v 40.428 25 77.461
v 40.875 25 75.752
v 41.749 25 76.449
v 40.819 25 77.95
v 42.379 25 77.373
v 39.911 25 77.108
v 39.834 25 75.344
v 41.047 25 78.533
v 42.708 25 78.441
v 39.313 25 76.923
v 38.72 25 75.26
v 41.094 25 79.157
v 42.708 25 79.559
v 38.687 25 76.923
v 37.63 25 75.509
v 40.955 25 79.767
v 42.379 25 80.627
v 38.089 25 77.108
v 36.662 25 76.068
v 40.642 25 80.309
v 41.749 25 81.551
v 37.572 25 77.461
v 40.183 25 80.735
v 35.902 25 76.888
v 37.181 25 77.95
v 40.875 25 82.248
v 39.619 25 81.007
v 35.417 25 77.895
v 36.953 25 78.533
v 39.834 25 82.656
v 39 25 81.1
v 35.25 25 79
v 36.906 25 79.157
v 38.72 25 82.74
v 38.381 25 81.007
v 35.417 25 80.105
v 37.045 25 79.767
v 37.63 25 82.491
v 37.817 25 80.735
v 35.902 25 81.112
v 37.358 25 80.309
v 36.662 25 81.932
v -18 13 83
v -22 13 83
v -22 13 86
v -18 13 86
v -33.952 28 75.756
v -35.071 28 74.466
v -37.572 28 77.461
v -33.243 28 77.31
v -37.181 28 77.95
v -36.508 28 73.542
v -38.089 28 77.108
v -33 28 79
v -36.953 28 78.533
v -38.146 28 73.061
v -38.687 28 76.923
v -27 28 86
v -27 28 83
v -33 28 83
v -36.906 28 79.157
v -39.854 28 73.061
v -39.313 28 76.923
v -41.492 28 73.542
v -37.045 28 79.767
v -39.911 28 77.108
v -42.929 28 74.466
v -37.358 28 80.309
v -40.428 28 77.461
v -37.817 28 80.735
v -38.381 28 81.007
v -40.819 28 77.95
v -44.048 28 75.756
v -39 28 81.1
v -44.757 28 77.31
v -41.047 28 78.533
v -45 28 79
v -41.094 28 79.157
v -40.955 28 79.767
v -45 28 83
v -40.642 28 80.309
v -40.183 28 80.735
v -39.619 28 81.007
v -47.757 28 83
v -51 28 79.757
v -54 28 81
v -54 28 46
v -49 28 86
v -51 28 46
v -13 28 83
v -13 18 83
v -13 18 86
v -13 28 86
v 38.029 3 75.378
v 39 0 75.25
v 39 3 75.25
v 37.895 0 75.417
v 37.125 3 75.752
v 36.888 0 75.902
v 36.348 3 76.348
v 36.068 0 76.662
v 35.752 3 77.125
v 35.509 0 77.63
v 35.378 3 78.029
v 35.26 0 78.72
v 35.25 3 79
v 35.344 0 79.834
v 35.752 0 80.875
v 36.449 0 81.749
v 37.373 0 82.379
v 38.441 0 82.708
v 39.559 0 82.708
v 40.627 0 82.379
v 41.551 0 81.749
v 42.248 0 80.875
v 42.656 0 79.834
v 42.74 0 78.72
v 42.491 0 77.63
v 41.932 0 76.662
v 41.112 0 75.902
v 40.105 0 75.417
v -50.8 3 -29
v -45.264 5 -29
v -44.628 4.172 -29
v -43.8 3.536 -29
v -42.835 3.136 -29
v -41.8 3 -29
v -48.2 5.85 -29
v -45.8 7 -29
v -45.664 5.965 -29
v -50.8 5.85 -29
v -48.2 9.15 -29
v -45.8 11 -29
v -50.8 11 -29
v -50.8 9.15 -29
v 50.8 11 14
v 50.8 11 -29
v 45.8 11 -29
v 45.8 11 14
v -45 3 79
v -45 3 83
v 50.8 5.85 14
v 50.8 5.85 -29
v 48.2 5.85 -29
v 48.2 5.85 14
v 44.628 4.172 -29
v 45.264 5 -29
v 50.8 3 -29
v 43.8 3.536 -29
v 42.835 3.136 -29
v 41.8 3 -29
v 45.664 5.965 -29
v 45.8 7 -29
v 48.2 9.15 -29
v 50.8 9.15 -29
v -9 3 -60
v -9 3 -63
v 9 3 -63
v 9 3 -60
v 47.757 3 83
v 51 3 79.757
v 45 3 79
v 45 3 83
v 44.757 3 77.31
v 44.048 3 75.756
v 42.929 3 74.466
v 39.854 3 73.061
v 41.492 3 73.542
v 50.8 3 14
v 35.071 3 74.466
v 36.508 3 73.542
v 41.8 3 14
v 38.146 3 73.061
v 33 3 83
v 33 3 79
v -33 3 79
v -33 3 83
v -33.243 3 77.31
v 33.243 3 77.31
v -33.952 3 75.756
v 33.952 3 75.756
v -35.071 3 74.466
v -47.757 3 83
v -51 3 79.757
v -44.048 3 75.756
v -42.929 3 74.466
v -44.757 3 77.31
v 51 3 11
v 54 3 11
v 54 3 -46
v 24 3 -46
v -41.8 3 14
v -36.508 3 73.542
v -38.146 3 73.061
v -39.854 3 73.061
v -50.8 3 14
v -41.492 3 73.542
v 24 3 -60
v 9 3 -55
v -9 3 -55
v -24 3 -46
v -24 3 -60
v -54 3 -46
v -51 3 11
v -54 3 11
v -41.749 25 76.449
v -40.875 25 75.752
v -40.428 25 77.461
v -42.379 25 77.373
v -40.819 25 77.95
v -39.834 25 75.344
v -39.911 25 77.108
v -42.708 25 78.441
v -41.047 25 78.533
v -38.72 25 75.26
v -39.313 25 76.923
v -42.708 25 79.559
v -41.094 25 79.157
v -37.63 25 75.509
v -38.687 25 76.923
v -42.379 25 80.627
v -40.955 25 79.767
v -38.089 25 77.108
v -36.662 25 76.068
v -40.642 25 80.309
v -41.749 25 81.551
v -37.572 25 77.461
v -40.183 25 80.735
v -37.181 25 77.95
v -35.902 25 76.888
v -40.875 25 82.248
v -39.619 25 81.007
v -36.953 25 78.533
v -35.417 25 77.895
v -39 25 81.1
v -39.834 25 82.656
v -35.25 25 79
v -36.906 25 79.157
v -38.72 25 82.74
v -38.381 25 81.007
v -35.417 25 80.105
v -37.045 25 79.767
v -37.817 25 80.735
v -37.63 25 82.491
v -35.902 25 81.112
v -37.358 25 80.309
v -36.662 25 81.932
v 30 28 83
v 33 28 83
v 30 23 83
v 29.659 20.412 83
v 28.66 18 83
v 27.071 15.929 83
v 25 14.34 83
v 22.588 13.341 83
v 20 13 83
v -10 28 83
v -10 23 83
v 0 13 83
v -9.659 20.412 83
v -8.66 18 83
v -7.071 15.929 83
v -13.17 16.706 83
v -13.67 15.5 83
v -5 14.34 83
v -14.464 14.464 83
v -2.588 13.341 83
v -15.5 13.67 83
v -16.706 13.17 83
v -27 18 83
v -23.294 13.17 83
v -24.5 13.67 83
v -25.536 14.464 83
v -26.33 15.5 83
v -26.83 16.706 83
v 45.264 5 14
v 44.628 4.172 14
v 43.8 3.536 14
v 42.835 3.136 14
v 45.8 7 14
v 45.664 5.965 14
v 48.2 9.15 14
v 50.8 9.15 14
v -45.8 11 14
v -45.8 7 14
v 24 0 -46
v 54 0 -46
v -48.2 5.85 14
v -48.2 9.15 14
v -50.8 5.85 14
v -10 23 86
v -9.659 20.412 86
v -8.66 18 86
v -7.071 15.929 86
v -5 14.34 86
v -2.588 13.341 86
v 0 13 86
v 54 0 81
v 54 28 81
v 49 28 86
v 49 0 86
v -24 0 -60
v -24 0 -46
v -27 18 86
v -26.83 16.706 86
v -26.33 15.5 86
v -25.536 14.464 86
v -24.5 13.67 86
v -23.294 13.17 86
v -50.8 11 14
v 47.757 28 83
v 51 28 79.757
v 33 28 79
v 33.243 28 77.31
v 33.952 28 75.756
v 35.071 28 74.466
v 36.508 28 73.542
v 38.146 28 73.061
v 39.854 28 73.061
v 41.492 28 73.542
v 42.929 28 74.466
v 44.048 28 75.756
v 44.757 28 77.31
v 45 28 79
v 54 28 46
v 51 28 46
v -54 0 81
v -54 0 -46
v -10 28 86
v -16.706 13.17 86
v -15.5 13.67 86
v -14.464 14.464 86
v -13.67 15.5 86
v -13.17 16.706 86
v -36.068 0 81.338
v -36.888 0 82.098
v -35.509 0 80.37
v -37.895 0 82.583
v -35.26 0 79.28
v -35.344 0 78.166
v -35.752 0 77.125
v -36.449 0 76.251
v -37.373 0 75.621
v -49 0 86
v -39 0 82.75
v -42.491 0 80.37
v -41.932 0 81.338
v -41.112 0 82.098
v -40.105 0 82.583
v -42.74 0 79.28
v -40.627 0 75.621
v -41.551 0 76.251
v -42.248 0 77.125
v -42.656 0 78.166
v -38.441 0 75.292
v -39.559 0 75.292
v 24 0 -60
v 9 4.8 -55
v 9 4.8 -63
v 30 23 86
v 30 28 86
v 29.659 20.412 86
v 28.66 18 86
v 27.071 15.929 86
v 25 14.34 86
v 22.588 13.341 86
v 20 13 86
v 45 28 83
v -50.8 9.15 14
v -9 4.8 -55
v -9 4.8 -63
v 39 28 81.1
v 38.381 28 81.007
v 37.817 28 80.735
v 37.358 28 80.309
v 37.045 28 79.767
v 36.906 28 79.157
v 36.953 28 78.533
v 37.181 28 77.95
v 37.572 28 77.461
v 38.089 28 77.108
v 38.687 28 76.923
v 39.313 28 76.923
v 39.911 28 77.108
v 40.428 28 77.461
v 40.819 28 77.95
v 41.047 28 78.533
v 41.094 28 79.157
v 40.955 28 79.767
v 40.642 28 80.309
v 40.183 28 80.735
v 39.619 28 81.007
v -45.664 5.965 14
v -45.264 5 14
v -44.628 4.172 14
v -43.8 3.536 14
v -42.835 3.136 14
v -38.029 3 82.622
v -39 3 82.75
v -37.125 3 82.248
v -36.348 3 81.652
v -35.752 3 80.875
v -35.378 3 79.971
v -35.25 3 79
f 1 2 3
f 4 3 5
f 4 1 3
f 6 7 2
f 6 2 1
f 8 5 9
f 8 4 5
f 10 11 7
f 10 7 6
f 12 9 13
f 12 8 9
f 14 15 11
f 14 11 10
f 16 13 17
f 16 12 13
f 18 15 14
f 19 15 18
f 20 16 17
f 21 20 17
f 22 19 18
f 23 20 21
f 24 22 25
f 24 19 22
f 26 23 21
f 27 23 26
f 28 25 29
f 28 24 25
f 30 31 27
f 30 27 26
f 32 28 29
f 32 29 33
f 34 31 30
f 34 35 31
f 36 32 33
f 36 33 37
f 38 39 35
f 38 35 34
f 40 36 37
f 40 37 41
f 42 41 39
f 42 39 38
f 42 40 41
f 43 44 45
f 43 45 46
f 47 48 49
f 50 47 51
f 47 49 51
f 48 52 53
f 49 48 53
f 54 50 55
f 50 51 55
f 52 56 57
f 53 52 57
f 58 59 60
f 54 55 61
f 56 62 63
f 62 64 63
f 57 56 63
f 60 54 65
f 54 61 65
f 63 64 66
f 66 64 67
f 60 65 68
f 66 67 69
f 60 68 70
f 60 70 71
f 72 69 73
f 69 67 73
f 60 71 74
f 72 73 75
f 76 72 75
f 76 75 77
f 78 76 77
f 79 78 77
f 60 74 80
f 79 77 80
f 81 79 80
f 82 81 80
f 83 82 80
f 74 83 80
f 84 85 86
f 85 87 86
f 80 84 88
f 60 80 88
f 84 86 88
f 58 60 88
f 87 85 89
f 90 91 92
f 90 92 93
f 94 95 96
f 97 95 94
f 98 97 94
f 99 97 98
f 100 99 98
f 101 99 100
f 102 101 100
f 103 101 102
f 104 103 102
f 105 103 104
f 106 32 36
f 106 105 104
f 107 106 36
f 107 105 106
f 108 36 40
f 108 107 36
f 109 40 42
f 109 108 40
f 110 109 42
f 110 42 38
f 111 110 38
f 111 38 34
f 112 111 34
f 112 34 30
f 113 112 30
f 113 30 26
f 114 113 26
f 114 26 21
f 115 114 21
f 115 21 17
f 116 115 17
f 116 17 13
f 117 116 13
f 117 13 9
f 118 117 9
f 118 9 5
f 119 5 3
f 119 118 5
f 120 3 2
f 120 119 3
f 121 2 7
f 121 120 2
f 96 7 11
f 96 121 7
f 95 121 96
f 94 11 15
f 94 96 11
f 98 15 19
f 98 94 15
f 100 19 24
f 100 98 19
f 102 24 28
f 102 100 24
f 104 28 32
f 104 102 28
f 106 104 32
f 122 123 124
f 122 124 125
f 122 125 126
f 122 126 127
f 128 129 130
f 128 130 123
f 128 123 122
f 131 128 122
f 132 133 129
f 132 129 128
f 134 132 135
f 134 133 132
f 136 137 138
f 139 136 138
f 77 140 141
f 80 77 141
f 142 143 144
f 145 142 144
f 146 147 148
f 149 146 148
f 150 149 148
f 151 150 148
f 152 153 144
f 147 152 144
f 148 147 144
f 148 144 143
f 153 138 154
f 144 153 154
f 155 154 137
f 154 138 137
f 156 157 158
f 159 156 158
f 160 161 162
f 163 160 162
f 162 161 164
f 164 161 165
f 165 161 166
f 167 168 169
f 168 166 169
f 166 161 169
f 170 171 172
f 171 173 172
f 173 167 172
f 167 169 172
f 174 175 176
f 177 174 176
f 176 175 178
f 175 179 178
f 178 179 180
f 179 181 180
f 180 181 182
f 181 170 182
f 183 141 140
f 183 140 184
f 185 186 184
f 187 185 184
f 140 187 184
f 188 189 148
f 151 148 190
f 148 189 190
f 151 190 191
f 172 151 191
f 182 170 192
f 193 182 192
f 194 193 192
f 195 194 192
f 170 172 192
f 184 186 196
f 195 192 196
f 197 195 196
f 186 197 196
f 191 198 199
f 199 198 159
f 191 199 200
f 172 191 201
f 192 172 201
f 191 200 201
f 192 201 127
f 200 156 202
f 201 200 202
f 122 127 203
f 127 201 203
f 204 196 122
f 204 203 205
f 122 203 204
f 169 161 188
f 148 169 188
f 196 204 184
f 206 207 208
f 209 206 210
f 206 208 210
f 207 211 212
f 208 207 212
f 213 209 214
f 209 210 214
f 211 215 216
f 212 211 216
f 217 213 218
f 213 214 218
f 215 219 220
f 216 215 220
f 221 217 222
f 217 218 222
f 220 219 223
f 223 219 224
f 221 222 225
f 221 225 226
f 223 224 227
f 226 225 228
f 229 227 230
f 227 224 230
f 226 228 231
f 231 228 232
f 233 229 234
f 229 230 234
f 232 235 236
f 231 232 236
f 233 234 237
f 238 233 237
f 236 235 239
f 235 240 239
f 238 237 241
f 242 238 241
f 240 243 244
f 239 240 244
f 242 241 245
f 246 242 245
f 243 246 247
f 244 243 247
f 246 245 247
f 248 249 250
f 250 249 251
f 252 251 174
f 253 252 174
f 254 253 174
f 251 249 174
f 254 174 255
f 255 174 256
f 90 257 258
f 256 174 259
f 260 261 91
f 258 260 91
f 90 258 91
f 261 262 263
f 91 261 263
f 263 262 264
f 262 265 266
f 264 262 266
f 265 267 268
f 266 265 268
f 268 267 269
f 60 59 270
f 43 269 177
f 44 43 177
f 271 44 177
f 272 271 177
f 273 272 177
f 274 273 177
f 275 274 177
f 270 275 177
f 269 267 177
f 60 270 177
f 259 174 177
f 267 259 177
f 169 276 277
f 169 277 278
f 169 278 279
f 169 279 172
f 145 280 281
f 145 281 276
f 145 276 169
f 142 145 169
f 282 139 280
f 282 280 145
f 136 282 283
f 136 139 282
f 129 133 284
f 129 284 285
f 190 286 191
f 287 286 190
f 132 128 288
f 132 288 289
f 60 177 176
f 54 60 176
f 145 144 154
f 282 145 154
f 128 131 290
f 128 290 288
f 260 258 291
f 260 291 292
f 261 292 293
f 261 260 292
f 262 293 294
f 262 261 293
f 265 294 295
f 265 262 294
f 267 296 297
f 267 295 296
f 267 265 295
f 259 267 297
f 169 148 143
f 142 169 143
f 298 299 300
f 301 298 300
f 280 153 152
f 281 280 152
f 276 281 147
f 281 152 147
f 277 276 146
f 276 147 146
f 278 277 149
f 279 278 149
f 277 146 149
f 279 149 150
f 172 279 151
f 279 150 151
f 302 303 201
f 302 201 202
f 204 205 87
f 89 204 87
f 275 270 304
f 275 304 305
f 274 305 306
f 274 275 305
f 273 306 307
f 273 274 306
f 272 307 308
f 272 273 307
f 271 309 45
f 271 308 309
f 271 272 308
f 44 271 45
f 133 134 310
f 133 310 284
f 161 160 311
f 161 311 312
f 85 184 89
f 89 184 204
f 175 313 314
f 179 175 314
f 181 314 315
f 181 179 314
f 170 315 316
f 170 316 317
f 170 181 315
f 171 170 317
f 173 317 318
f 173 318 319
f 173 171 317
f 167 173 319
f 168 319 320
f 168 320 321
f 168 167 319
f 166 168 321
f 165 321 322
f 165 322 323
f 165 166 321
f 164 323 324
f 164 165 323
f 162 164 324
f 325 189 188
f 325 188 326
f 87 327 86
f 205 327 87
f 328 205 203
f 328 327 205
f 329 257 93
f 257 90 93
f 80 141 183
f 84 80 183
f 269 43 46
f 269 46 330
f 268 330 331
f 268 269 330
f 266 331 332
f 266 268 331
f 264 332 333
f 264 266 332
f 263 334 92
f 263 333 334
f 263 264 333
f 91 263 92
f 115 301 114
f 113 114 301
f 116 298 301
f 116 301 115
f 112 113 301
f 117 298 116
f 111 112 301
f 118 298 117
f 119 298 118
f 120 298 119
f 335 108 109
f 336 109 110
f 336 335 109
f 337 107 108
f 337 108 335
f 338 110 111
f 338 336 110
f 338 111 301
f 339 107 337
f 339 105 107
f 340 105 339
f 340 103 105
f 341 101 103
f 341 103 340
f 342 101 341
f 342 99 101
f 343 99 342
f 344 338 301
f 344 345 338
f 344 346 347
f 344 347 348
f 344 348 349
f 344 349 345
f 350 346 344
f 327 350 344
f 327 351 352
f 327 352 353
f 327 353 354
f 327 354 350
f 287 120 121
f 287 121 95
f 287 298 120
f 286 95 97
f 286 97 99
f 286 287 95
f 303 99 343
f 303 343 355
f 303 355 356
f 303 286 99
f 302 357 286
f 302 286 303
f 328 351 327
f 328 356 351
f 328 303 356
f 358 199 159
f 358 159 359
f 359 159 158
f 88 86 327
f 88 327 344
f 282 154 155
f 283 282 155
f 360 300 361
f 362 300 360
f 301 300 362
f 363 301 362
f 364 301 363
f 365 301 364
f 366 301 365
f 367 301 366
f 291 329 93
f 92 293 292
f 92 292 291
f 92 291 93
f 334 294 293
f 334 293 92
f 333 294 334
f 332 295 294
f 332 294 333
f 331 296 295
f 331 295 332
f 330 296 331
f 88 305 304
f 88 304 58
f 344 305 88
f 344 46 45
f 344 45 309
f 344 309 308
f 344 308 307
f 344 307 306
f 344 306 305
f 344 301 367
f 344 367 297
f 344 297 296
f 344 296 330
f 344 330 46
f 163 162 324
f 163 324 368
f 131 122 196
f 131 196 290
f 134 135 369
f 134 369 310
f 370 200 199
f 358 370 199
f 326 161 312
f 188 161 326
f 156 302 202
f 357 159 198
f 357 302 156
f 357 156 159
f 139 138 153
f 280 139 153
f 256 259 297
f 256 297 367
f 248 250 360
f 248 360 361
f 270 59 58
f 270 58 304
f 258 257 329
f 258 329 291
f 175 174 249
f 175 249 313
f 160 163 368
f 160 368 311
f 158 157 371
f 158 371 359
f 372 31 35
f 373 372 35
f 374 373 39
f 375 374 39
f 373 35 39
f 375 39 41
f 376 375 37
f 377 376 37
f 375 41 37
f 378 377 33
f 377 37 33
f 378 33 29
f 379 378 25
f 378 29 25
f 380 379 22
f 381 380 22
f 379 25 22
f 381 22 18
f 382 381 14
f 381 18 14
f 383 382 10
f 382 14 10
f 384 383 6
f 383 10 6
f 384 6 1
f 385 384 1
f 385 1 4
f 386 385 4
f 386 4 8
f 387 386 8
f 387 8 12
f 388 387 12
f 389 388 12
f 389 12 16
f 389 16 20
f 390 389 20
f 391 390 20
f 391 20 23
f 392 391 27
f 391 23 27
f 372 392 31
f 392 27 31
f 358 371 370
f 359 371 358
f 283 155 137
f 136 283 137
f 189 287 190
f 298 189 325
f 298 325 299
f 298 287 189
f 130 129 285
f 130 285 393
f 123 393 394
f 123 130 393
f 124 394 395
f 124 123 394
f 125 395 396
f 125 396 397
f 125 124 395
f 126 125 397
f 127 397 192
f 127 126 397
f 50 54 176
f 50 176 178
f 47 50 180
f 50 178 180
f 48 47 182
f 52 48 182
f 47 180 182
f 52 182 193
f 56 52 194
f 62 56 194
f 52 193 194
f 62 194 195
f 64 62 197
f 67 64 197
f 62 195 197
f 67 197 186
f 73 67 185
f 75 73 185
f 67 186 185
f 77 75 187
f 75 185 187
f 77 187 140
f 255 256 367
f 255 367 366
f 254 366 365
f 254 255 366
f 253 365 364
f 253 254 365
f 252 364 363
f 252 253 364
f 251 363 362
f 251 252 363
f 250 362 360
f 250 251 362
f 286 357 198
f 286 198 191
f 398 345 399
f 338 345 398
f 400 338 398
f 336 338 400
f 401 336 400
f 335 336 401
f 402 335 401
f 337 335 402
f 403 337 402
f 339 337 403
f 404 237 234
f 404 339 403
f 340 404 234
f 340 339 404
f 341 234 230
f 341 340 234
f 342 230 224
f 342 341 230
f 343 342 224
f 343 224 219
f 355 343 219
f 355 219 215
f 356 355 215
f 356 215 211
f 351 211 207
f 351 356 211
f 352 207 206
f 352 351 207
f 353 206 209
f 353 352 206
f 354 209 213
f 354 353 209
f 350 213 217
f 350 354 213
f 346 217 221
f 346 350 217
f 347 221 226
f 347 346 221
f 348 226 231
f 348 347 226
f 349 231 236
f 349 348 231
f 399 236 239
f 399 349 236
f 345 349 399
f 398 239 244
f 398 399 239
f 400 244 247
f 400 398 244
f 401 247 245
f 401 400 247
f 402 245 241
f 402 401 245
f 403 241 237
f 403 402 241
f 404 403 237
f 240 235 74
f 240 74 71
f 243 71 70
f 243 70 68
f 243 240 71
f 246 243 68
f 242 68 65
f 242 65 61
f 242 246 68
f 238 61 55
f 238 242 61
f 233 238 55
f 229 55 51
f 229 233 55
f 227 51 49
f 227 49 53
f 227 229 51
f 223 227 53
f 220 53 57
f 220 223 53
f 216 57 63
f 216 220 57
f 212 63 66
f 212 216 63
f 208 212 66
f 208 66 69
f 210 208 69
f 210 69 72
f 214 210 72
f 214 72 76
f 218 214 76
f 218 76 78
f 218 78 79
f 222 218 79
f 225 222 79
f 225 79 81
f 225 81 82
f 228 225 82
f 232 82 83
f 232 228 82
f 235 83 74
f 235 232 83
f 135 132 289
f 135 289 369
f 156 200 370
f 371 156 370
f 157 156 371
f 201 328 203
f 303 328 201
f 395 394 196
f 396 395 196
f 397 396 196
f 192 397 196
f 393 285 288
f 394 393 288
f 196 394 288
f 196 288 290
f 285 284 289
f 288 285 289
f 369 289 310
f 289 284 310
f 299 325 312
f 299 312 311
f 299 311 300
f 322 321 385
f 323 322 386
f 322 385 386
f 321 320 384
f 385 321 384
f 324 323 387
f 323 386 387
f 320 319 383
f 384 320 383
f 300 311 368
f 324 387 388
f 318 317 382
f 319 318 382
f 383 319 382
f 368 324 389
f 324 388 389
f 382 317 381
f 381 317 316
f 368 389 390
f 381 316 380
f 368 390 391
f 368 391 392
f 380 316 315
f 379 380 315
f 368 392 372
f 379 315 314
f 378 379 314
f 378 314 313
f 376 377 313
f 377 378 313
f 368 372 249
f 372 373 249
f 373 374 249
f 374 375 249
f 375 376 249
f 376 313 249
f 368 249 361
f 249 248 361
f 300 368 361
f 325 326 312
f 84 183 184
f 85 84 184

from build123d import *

# Parameters (mm, degrees)
CROQUIS1_R                 = 3.75
SALIENTE_EXTRUIR1_DEPTH    = 3
SALIENTE_EXTRUIR5_START    = -17
SALIENTE_EXTRUIR5_DEPTH    = 43
SALIENTE_EXTRUIR3_DEPTH    = 3
CROQUIS4_R                 = 3.75
SALIENTE_EXTRUIR4_DEPTH    = 25
SALIENTE_EXTRUIR7_START    = -3
CROQUIS8_R                 = 3.75
CROQUIS8_R_2               = 2.1
SALIENTE_EXTRUIR7_DEPTH    = 3
CROQUIS7_W                 = 18
CROQUIS7_H                 = 8
SALIENTE_EXTRUIR6_DEPTH    = 1.8
CORTAR_EXTRUIR1_DEPTH      = 161.937876213
CORTAR_EXTRUIR1_DEPTH_BACK = 10


with BuildPart() as part:
    # Croquis1 → Saliente-Extruir1 (new body)
    with BuildSketch(Plane(origin=(0, 0, 0), x_dir=(1, 0, 0), z_dir=(0, 1, 0))):
        Polygon((-24, 60), (24, 60), (24, 46), (54, 46), (54, -81), (49, -86), (-49, -86), (-54, -81), (-54, 46), (-24, 46), align=None)
        with Locations(Location((-39, -79, 0), (0, 0, 270))):
            Circle(CROQUIS1_R, mode=Mode.SUBTRACT)
        with Locations(Location((39, -79, 0), (0, 0, 90))):
            Circle(CROQUIS1_R, mode=Mode.SUBTRACT)
    extrude(amount=SALIENTE_EXTRUIR1_DEPTH)

    # Croquis6 → Saliente-Extruir5 (add)
    with BuildSketch(Plane(origin=(0, 0, -46), x_dir=(-1, 0, 0), z_dir=(0, 0, -1)).offset(SALIENTE_EXTRUIR5_START)):
        with BuildLine():
            Line((50.8, 3), (50.8, 5.85))
            Line((50.8, 5.85), (48.2, 5.85))
            Line((48.2, 5.85), (48.2, 9.15))
            Line((48.2, 9.15), (50.8, 9.15))
            Line((50.8, 9.15), (50.8, 11))
            Line((50.8, 11), (45.8, 11))
            Line((45.8, 11), (45.8, 7))
            ThreePointArc((45.8, 7), (44.628427125, 4.171572875), (41.8, 3))
            Line((41.8, 3), (47.8, 3))
            Line((47.8, 3), (50.8, 3))
        make_face()
    saliente_extruir5 = extrude(amount=-SALIENTE_EXTRUIR5_DEPTH)

    # Croquis3 → Saliente-Extruir3 (add)
    with BuildSketch(Plane.ZY.offset(54)):
        Polygon((11, 3), (46, 28), (79.207391253, 28), (79.207391253, 3), align=None)
    saliente_extruir3 = extrude(amount=-SALIENTE_EXTRUIR3_DEPTH)

    # Croquis4 → Saliente-Extruir4 (add)
    with BuildSketch(Plane(origin=(0, 3, 0), x_dir=(1, 0, 0), z_dir=(0, 1, 0))):
        with BuildLine():
            Line((-51, -79.207391253), (-54, -79.207391253))
            Line((-54, -79.207391253), (-54, -81))
            Line((-54, -81), (-49, -86))
            Line((-49, -86), (0, -86))
            Line((0, -86), (0, -83))
            Line((0, -83), (-33, -83))
            Line((-33, -83), (-33, -79))
            ThreePointArc((-33, -79), (-39, -73), (-45, -79))
            Line((-45, -79), (-45, -83))
            Line((-45, -83), (-47.757359313, -83))
            Line((-47.757359313, -83), (-51, -79.757359313))
            Line((-51, -79.757359313), (-51, -79.207391253))
        make_face()
        with Locations((-39, -79)):
            Circle(CROQUIS4_R, mode=Mode.SUBTRACT)
    saliente_extruir4 = extrude(amount=SALIENTE_EXTRUIR4_DEPTH)

    # Croquis8 → Saliente-Extruir7 (add)
    with BuildSketch(Plane(origin=(0, 28, 0), x_dir=(1, 0, 0), z_dir=(0, 1, 0)).offset(SALIENTE_EXTRUIR7_START)):
        with Locations(Location((-39, -79, 0), (0, 0, 270))):
            Circle(CROQUIS8_R)
        with Locations(Location((-39, -79, 0), (0, 0, 270))):
            Circle(CROQUIS8_R_2, mode=Mode.SUBTRACT)
    saliente_extruir7 = extrude(amount=SALIENTE_EXTRUIR7_DEPTH)

    # Simetría1: Saliente-Extruir5, Saliente-Extruir3, Saliente-Extruir4, Saliente-Extruir7 across plane
    add(saliente_extruir5.mirror(Plane(origin=(0, 0, 0), x_dir=(0, 0, 1), z_dir=(1, 0, 0))))
    add(saliente_extruir3.mirror(Plane(origin=(0, 0, 0), x_dir=(0, 0, 1), z_dir=(1, 0, 0))))
    add(saliente_extruir4.mirror(Plane(origin=(0, 0, 0), x_dir=(0, 0, 1), z_dir=(1, 0, 0))))
    add(saliente_extruir7.mirror(Plane(origin=(0, 0, 0), x_dir=(0, 0, 1), z_dir=(1, 0, 0))))

    # Croquis7 → Saliente-Extruir6 (add)
    with BuildSketch(Plane(origin=(0, 3, 0), x_dir=(1, 0, 0), z_dir=(0, 1, 0))):
        with Locations((0, 59)):
            Rectangle(CROQUIS7_W, CROQUIS7_H)
    extrude(amount=SALIENTE_EXTRUIR6_DEPTH)

    # Croquis9 → Cortar-Extruir1 (cut, two sides: drawn at the far end of the back side and taken through both)
    with BuildSketch(Plane.XY.offset(86).offset(-CORTAR_EXTRUIR1_DEPTH_BACK)):
        with BuildLine():
            Line((30, 28), (-10, 28))
            Line((-10, 28), (-10, 23))
            ThreePointArc((-10, 23), (-7.071067812, 15.928932188), (0, 13))
            Line((0, 13), (20, 13))
            ThreePointArc((20, 13), (27.071067812, 15.928932188), (30, 23))
            Line((30, 23), (30, 28))
        make_face()
        with BuildLine():
            Line((-13, 18), (-13, 28))
            Line((-13, 28), (-27, 28))
            Line((-27, 28), (-27, 18))
            ThreePointArc((-27, 18), (-25.535533906, 14.464466094), (-22, 13))
            Line((-22, 13), (-18, 13))
            ThreePointArc((-18, 13), (-14.464466094, 14.464466094), (-13, 18))
        make_face()
    extrude(amount=CORTAR_EXTRUIR1_DEPTH + CORTAR_EXTRUIR1_DEPTH_BACK, mode=Mode.SUBTRACT)


solid = part.part
